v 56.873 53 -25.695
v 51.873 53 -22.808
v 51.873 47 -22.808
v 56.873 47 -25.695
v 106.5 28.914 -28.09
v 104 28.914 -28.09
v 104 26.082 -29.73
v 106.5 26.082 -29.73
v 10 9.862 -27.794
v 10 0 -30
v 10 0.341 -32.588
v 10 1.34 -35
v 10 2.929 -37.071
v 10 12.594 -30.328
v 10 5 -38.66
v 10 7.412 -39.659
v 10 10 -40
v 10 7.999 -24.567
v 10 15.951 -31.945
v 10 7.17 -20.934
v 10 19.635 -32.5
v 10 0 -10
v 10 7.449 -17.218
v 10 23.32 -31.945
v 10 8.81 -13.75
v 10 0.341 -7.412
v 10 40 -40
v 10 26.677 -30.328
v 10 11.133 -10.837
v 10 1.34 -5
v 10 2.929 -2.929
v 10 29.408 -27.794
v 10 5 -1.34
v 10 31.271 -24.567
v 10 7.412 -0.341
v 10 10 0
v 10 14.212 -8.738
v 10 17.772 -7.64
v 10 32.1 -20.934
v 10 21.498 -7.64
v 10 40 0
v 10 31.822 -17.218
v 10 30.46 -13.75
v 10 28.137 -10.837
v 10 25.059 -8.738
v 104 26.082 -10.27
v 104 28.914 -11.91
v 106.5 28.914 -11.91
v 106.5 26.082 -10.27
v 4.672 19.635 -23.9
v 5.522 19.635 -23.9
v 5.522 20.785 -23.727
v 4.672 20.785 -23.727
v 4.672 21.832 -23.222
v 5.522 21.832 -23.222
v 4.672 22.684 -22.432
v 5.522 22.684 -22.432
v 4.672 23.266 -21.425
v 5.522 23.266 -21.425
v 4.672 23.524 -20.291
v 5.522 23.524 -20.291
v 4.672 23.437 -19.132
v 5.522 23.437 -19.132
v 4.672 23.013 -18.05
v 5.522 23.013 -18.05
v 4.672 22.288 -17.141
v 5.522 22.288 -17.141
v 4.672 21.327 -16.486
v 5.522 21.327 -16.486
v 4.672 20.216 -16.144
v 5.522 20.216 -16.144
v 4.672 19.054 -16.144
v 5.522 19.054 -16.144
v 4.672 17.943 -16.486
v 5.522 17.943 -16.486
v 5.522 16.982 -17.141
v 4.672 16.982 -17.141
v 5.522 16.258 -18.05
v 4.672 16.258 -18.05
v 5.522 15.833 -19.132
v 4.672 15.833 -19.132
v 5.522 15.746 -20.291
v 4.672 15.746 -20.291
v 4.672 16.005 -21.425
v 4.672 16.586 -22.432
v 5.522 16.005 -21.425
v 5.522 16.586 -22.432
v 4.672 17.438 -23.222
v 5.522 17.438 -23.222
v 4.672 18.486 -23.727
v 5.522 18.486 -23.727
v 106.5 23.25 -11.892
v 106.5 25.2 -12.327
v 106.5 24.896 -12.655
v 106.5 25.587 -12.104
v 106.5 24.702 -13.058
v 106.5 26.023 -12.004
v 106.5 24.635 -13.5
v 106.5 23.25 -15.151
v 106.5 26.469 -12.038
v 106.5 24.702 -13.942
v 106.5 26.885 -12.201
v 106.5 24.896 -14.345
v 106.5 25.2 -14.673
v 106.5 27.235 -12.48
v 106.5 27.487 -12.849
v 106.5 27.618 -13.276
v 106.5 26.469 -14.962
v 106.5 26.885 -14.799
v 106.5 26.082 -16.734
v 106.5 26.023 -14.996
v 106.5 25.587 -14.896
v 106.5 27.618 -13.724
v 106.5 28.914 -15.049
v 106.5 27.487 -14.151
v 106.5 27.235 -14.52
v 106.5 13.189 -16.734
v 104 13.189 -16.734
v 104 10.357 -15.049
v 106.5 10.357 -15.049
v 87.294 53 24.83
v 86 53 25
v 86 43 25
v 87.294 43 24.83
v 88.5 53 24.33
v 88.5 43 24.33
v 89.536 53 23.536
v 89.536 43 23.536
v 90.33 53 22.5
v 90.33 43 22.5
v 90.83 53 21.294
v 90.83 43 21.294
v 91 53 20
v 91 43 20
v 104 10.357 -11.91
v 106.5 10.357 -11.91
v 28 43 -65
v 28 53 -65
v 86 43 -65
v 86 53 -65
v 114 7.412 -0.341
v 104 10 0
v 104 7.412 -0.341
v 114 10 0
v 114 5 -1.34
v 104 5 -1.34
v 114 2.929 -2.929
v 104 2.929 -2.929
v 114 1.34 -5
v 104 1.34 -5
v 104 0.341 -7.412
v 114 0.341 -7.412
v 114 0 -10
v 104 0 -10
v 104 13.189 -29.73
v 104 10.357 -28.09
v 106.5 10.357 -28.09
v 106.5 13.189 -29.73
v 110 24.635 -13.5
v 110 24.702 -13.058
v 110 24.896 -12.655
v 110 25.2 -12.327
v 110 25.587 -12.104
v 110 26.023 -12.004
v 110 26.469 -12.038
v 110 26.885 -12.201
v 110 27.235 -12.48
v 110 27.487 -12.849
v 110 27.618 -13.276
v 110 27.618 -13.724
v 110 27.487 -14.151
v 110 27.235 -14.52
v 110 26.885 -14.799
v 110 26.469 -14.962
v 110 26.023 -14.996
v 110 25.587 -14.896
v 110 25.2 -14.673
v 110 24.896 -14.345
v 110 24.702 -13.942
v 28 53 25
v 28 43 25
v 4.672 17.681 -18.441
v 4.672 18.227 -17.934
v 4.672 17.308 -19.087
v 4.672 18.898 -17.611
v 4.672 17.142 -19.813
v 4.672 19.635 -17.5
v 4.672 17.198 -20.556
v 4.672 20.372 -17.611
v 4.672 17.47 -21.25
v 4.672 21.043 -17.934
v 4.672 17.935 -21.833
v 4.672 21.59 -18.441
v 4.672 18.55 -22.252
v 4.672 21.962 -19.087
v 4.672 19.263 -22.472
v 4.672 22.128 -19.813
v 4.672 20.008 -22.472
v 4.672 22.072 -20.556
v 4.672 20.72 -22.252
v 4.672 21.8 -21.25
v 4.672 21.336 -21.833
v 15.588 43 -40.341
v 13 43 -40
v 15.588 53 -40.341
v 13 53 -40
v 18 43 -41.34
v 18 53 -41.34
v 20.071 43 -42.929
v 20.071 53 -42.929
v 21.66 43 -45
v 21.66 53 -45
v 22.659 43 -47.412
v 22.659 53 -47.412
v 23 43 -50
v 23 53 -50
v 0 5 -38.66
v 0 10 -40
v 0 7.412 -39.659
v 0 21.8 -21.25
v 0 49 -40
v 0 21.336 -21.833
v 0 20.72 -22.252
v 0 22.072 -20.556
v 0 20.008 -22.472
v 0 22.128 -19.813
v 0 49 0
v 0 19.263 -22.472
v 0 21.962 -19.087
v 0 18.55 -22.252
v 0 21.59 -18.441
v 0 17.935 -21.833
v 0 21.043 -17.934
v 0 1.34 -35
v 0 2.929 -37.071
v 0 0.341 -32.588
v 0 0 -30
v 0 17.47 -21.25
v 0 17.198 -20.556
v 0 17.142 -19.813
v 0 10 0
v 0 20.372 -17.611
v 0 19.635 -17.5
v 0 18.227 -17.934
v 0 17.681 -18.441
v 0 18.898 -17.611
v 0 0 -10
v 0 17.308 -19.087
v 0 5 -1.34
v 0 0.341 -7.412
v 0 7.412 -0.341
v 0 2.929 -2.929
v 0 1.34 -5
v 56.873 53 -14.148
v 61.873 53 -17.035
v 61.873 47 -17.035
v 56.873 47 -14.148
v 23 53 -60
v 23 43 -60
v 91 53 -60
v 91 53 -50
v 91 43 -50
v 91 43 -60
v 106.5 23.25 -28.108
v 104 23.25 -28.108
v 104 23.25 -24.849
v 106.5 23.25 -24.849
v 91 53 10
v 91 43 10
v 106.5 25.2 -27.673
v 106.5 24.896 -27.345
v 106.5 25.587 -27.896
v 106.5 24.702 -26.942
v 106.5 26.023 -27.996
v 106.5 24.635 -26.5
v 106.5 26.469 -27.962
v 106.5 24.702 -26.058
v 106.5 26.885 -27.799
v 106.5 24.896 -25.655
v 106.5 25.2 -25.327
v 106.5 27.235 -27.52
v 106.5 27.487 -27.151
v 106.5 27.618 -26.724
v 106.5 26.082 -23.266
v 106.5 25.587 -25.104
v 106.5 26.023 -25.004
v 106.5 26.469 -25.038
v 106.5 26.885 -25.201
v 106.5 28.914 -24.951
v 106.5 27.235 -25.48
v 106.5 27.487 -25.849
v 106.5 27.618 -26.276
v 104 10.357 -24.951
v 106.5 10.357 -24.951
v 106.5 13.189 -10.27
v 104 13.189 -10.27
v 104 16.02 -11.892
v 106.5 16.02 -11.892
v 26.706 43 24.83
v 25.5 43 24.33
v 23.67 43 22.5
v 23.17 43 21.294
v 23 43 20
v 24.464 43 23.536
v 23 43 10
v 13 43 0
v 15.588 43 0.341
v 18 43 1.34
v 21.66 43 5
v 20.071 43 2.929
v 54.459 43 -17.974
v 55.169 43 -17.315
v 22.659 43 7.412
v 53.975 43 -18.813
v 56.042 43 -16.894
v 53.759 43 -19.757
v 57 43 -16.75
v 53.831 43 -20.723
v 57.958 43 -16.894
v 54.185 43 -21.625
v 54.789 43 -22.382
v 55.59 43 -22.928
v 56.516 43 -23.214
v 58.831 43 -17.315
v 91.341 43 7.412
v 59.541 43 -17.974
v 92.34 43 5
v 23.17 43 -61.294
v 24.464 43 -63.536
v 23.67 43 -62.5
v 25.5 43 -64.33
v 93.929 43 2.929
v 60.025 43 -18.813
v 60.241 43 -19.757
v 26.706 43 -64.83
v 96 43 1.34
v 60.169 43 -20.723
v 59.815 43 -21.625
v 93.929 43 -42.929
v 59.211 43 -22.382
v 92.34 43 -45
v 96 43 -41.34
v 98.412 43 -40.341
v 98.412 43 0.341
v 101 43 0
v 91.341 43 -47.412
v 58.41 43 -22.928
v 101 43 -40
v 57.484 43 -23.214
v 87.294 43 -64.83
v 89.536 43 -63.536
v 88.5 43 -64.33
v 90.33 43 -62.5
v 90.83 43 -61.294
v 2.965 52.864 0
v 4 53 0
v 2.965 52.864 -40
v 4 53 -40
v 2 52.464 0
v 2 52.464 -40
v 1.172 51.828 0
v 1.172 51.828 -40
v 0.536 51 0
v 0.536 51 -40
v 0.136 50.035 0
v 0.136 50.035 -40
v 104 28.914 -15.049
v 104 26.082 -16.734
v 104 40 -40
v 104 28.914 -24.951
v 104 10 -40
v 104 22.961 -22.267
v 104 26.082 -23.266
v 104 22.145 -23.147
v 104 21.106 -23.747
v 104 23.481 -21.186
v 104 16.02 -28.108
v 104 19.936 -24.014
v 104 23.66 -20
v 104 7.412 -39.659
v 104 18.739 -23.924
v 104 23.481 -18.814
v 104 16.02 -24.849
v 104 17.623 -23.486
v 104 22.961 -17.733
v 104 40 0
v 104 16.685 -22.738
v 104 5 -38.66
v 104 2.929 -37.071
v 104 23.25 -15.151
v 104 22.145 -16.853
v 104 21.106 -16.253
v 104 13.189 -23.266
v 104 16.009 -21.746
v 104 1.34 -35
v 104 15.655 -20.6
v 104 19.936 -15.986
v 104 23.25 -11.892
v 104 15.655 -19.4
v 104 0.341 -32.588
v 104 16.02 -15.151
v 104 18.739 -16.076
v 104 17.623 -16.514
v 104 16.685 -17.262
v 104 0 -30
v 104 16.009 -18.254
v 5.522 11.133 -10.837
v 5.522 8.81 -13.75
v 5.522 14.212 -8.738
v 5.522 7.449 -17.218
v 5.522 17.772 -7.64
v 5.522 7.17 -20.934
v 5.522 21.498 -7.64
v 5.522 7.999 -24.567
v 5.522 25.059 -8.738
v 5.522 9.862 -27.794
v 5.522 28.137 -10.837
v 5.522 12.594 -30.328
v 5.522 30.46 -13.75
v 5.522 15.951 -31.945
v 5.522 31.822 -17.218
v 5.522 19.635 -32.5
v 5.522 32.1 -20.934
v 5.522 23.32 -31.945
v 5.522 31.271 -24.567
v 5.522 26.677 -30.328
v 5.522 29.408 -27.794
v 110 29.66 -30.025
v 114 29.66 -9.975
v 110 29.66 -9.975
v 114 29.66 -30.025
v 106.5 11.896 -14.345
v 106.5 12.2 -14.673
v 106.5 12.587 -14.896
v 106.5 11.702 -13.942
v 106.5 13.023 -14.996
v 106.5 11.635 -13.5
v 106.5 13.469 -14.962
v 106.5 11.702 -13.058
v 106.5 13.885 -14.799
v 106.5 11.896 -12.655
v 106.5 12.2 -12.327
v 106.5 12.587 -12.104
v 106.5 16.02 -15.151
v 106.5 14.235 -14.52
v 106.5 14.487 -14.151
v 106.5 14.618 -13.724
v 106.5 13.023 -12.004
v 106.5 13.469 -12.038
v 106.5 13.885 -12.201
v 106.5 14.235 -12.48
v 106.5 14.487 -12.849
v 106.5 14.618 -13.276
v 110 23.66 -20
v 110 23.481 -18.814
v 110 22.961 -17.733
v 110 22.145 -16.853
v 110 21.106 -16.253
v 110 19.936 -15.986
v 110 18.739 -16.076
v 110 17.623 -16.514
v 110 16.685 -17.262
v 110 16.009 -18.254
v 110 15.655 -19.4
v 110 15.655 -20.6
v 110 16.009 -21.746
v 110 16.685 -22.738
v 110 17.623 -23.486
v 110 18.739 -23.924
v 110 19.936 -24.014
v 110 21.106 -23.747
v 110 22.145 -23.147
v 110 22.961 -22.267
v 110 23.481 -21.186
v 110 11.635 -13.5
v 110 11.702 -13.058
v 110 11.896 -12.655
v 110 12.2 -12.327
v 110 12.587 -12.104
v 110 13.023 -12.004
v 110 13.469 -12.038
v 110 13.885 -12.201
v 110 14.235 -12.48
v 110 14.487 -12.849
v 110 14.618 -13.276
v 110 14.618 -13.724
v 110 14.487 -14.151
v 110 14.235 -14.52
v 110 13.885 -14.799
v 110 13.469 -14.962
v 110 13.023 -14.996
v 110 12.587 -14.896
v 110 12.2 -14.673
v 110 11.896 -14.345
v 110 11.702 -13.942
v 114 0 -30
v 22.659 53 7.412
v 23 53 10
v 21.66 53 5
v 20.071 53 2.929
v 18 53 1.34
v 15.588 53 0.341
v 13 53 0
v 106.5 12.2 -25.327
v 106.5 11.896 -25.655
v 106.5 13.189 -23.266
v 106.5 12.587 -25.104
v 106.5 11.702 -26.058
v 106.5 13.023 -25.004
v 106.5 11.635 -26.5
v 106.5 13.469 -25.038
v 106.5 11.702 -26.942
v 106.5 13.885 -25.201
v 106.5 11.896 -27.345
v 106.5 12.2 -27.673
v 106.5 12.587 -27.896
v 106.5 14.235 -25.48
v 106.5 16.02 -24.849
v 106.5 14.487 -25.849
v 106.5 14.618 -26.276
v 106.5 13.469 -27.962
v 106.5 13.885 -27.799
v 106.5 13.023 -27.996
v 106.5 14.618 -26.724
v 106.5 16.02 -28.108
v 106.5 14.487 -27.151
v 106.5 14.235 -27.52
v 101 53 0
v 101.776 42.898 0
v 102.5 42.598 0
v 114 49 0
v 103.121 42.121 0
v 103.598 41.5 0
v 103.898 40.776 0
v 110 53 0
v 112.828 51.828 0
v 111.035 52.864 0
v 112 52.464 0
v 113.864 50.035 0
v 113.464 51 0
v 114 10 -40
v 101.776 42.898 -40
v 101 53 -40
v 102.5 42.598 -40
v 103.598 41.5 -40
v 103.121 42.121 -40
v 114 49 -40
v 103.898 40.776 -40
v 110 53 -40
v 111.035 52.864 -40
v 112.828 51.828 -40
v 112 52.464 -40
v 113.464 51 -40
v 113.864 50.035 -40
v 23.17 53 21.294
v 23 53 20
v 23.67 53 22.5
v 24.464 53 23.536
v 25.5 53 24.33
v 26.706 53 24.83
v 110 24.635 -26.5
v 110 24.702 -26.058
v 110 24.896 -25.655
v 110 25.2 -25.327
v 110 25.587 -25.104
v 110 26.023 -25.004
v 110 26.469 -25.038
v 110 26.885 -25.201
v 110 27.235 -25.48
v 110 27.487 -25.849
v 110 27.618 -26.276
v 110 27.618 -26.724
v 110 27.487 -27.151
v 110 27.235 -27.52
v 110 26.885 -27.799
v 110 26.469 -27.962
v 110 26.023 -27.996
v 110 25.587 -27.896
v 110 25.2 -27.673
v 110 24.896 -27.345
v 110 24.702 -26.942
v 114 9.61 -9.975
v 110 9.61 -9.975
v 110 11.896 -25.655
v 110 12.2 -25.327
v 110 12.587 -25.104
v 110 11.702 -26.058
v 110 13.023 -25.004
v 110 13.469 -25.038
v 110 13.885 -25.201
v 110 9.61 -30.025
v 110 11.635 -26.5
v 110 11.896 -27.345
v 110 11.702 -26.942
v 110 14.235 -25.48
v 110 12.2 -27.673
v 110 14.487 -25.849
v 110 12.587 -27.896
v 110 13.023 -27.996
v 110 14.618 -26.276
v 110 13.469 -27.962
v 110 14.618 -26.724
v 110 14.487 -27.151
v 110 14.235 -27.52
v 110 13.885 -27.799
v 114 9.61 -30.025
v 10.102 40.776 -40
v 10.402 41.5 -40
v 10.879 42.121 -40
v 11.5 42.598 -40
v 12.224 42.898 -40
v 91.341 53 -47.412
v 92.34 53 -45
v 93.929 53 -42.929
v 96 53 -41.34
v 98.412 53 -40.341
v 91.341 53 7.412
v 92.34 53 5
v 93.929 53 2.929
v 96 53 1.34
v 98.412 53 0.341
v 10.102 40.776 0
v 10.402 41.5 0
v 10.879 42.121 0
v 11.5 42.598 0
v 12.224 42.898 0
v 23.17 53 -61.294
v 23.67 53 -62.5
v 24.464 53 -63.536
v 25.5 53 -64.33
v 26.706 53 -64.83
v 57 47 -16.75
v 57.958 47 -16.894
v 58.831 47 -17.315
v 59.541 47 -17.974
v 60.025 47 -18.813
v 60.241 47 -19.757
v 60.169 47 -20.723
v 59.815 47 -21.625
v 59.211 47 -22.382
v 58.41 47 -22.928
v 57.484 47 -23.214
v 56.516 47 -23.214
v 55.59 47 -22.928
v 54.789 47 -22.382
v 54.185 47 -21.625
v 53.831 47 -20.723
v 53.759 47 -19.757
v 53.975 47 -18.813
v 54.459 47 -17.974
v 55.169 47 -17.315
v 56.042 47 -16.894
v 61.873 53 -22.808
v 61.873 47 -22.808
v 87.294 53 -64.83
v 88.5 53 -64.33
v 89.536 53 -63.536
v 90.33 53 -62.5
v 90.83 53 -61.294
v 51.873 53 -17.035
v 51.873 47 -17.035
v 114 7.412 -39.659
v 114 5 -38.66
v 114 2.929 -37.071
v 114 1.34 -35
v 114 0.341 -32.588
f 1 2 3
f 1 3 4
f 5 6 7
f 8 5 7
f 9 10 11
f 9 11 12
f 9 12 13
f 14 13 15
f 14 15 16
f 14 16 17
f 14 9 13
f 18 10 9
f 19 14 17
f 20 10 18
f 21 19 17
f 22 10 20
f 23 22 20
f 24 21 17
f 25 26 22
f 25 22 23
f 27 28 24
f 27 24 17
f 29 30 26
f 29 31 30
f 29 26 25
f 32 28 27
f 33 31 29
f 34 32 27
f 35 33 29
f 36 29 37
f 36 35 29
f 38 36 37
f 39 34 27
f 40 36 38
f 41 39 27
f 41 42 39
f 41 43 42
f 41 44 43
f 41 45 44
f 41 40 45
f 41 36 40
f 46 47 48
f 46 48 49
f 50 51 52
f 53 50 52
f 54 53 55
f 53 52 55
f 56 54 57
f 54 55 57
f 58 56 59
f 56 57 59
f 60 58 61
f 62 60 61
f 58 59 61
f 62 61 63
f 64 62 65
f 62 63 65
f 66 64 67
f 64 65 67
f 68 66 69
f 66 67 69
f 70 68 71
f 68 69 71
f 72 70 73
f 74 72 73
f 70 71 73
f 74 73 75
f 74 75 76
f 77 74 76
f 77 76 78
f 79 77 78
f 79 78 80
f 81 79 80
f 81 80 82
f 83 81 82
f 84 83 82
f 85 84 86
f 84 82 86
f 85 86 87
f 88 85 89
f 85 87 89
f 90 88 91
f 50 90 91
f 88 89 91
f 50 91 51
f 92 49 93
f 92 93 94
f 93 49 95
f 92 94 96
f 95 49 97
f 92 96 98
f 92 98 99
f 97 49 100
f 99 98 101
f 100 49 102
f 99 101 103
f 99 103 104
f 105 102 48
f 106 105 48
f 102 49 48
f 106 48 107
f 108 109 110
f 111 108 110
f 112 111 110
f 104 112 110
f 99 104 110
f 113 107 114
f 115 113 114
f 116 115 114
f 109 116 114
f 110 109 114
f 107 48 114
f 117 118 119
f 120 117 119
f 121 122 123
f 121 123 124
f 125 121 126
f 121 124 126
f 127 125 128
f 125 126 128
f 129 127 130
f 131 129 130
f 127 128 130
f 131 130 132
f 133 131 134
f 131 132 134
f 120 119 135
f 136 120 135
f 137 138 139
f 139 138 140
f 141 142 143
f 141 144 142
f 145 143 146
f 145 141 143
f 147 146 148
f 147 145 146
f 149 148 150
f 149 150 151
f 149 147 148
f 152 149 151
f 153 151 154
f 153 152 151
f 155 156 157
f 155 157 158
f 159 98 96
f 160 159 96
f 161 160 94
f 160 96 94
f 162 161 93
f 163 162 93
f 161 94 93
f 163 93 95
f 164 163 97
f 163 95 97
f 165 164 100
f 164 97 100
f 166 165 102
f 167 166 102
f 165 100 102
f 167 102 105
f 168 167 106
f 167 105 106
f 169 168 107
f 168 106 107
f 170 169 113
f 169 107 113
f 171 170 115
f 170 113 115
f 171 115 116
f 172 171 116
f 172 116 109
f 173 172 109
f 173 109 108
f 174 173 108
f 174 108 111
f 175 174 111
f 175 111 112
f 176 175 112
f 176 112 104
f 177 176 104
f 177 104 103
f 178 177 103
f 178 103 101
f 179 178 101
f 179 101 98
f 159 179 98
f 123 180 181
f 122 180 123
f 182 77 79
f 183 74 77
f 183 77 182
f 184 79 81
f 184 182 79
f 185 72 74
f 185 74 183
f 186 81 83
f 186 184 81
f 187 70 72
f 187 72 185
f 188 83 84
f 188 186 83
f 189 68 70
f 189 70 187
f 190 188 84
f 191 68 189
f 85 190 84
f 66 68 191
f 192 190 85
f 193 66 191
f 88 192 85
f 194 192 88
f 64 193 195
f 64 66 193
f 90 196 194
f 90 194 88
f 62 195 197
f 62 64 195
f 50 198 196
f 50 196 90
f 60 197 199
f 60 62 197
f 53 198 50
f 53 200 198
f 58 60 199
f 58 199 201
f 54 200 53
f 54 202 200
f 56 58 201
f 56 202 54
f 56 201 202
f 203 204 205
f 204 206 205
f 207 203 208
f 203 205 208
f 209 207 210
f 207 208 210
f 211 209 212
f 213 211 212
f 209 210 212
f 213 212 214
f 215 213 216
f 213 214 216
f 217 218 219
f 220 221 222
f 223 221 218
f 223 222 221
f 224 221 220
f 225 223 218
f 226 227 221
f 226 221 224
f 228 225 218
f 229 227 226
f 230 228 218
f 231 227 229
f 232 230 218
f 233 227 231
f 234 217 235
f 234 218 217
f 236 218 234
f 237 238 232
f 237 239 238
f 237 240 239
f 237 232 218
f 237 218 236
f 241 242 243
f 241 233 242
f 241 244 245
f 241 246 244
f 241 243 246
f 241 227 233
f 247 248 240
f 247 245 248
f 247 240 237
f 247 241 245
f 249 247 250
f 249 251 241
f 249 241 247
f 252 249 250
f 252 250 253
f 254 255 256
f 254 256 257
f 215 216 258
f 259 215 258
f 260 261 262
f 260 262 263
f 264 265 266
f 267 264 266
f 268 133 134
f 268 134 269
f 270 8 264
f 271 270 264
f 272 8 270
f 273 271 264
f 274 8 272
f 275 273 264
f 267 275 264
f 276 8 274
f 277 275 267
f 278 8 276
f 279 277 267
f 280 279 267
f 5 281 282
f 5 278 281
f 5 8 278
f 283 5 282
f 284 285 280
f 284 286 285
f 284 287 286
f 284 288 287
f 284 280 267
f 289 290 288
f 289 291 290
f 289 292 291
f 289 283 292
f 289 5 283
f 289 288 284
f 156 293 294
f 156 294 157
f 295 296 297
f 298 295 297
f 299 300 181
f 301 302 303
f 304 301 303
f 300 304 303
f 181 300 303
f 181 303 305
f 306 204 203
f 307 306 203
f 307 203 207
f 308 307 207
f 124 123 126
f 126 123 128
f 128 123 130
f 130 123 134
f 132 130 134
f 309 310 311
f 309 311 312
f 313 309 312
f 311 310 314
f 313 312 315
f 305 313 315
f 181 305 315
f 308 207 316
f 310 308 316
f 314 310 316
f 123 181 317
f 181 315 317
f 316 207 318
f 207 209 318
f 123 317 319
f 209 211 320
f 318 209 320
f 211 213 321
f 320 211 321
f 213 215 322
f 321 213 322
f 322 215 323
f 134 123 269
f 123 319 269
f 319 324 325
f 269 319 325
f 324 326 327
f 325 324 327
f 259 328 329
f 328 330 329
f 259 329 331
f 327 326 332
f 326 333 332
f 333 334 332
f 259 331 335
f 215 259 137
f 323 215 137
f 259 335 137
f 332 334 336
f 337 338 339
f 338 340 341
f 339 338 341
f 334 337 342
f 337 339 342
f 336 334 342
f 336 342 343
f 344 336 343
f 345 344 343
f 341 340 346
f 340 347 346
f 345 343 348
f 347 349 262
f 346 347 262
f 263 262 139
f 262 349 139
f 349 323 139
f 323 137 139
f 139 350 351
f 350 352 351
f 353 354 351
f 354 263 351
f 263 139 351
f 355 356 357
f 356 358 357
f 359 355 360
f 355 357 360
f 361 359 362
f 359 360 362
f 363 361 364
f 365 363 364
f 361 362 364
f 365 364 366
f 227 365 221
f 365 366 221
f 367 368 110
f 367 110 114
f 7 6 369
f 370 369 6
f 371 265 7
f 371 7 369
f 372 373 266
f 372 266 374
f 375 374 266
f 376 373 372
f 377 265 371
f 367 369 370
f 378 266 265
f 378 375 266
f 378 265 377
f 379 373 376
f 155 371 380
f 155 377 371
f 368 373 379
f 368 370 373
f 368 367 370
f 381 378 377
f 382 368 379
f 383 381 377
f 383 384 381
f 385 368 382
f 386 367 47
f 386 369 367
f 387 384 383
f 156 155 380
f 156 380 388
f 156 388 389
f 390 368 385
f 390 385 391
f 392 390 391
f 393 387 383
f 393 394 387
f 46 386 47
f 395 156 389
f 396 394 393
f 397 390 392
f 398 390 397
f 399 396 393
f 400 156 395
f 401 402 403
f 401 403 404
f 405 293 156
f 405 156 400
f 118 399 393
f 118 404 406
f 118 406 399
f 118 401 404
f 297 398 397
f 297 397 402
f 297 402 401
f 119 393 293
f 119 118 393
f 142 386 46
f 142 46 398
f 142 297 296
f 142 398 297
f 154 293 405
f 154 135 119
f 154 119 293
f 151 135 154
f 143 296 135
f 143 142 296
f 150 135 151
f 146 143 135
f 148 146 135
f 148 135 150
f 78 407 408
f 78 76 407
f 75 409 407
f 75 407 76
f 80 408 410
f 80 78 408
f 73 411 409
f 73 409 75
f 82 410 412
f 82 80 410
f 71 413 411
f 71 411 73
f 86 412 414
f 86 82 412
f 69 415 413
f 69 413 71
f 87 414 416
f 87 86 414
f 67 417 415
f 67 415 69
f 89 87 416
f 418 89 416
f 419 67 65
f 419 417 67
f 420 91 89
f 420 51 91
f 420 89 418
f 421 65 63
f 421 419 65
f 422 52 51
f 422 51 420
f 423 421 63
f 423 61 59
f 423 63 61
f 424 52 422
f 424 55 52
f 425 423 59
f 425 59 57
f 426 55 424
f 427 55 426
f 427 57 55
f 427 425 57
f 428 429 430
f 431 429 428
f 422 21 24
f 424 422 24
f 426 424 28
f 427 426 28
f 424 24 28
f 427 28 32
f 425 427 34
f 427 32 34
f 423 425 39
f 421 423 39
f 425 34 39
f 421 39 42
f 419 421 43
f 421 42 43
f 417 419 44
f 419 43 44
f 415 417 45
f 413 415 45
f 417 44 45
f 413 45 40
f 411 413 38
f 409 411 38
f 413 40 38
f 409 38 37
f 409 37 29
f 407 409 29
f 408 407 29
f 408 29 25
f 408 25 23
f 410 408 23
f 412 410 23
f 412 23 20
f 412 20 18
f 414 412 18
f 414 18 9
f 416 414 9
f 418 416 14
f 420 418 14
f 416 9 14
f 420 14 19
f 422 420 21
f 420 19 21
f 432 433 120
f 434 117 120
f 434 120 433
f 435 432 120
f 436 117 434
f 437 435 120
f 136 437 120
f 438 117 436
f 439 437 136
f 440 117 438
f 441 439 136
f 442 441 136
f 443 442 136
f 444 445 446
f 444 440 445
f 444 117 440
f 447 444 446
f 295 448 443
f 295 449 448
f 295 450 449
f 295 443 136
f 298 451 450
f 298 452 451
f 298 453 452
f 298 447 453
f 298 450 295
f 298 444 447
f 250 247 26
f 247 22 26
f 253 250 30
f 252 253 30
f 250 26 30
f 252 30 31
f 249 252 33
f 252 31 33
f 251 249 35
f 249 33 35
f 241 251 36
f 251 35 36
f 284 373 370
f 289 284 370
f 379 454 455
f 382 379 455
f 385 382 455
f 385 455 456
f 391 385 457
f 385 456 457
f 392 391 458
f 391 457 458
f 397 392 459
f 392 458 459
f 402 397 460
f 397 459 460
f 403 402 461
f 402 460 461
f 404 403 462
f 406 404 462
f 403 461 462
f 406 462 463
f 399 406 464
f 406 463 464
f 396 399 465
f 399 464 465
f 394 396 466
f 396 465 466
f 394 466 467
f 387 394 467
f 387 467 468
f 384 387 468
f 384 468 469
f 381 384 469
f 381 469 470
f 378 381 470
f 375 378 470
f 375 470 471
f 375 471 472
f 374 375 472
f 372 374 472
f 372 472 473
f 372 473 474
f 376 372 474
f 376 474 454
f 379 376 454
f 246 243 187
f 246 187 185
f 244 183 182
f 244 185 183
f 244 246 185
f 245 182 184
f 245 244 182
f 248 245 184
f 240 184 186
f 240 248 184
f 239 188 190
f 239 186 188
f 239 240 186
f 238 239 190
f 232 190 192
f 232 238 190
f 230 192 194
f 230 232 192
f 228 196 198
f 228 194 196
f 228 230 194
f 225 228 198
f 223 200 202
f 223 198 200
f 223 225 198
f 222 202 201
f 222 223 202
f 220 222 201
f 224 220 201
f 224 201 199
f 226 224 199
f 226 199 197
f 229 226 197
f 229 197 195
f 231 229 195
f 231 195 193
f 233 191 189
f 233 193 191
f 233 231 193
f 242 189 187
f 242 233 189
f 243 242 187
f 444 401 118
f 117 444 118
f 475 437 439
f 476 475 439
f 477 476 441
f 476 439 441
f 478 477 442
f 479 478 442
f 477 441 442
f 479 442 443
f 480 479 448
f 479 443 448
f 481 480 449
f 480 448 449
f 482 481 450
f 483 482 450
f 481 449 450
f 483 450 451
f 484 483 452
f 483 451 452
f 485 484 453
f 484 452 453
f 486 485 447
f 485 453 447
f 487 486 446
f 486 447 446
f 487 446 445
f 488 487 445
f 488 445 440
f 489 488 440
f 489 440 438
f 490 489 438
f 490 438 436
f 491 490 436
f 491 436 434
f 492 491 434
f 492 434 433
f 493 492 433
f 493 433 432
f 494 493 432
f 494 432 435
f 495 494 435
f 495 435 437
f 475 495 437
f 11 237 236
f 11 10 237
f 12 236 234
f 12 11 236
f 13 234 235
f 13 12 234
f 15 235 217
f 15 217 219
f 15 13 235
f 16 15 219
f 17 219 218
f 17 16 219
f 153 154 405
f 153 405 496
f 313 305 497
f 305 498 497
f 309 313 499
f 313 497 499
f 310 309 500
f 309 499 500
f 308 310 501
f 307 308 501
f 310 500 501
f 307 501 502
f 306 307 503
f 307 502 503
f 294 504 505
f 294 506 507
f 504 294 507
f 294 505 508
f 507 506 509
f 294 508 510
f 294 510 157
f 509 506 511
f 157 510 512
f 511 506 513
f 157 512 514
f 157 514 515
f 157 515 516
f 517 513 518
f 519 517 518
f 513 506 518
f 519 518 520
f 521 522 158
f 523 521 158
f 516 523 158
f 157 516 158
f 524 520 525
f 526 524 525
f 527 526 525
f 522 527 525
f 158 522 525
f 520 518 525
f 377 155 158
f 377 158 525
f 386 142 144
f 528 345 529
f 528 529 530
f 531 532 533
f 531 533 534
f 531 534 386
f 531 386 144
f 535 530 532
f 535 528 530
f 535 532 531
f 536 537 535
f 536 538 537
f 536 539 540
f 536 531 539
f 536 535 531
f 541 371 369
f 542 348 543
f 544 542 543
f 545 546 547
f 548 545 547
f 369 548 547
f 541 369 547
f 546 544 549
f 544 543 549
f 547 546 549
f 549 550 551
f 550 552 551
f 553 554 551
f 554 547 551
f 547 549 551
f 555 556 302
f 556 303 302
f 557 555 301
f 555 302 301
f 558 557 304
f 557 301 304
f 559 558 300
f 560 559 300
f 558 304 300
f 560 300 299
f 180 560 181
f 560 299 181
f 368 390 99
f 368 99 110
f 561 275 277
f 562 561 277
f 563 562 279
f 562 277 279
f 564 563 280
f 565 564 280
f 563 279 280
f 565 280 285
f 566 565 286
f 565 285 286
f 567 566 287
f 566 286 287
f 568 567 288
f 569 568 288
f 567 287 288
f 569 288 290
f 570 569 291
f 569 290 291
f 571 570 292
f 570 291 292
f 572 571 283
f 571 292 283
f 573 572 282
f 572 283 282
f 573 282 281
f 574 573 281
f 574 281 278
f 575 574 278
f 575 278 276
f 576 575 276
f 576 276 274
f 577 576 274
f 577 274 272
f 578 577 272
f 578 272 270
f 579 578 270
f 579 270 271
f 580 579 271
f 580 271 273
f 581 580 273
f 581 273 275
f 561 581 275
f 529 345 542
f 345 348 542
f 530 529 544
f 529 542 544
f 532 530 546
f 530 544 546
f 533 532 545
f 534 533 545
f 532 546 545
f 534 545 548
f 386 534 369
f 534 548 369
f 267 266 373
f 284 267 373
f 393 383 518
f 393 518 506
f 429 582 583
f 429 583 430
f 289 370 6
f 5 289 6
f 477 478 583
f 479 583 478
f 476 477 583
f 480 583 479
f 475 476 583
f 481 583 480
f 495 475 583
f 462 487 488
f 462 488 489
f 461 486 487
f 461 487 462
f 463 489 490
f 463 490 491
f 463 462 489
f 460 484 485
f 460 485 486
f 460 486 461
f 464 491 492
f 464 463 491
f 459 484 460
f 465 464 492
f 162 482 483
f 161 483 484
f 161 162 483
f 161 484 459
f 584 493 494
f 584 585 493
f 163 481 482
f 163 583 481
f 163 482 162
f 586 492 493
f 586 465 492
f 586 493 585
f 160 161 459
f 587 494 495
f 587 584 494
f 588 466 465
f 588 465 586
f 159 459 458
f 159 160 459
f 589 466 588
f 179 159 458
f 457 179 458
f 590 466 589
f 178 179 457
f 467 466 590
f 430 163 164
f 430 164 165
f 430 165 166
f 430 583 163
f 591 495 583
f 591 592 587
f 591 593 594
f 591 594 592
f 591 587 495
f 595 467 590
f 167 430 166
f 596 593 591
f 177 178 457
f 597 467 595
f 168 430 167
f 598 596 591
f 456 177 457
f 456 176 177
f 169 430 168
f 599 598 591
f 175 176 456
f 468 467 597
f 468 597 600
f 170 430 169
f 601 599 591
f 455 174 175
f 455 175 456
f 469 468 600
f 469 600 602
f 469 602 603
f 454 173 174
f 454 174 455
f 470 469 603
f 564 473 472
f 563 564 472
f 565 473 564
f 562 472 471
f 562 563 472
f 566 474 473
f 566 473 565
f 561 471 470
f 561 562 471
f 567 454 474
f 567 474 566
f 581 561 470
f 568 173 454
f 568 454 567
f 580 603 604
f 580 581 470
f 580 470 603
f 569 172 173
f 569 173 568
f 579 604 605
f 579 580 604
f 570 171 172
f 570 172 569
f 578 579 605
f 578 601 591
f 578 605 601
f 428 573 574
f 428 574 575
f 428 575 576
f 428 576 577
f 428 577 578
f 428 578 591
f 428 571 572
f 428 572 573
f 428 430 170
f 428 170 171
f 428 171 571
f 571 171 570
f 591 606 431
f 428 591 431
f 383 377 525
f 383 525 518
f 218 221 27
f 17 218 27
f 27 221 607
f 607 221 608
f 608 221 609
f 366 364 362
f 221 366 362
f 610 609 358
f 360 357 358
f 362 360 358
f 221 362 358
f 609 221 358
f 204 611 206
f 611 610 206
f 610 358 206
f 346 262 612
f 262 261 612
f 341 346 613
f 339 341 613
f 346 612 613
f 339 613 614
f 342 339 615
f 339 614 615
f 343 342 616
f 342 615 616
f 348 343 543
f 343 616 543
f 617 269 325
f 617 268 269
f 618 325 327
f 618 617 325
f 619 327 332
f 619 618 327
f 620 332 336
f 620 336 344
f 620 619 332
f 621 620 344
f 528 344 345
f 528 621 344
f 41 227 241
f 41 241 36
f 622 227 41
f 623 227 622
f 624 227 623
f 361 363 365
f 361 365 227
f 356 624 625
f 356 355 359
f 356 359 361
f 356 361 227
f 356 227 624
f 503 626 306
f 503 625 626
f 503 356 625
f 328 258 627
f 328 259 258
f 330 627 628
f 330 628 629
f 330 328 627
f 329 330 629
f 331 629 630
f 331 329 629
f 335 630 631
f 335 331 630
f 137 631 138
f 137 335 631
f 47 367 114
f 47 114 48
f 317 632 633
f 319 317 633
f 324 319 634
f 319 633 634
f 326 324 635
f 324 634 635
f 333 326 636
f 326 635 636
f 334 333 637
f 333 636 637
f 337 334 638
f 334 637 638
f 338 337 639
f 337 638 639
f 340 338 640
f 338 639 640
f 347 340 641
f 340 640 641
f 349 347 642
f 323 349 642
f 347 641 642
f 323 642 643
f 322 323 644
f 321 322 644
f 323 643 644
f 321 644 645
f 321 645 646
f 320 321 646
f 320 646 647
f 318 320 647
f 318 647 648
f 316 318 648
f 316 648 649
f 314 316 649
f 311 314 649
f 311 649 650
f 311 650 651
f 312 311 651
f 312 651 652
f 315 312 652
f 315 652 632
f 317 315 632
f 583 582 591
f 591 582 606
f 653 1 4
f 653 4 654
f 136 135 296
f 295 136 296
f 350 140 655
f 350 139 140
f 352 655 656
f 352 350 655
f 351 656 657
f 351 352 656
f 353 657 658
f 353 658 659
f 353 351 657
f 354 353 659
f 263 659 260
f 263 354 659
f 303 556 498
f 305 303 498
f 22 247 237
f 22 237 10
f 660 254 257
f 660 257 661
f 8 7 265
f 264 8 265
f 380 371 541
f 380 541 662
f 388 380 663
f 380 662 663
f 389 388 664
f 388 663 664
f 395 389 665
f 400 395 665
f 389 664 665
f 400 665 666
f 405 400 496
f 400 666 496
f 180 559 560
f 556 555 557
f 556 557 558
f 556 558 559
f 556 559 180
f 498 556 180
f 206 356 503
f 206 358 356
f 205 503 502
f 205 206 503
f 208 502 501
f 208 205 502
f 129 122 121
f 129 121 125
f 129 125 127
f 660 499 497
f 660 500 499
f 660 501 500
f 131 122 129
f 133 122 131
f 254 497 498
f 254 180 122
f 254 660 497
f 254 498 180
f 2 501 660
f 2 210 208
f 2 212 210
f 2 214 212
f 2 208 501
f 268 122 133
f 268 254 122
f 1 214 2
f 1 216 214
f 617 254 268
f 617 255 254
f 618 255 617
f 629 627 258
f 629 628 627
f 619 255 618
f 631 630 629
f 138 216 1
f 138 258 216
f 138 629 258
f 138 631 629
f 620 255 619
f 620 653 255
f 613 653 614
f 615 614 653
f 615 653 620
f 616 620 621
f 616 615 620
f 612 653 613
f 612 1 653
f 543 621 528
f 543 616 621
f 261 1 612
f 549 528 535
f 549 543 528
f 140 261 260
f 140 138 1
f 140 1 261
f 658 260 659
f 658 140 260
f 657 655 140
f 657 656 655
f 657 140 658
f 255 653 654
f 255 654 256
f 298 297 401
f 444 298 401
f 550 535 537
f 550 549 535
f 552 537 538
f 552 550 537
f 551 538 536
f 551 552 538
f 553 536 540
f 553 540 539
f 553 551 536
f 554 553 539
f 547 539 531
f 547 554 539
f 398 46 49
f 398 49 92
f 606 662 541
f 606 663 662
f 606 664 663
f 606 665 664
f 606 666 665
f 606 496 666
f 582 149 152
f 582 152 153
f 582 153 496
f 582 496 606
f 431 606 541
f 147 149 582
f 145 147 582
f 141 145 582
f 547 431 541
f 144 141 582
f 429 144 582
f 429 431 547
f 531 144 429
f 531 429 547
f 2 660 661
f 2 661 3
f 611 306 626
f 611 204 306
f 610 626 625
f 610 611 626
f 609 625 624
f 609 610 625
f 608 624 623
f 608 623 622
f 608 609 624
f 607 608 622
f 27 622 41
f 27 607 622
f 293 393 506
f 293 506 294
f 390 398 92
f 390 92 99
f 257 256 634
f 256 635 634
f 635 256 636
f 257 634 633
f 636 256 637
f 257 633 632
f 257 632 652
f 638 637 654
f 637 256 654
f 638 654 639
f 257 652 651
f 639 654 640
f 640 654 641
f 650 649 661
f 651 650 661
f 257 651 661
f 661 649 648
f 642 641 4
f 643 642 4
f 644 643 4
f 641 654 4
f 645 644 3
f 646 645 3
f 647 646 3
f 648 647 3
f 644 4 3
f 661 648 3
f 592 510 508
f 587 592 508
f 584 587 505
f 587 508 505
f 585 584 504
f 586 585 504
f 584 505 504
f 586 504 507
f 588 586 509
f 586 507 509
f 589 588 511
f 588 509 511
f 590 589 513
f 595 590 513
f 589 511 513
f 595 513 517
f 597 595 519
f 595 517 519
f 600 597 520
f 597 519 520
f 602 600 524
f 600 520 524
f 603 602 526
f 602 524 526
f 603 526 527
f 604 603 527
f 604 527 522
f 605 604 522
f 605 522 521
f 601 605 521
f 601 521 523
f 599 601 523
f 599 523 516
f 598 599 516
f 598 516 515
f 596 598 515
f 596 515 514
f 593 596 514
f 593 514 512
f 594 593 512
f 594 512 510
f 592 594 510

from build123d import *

# Parameters (mm, degrees)
BOSS_EXTRUDE1_DEPTH     = 40
SKETCH2_R               = 12.5
CUT_EXTRUDE1_DEPTH      = 4.4775
FILLET1_R               = 10
CUT_EXTRUDE2_DEPTH      = 131.2
CUT_EXTRUDE2_DEPTH_BACK = 14.2
SKETCH4_R               = 2.5
SKETCH6_W               = 68
SKETCH6_H               = 90
BOSS_EXTRUDE4_DEPTH     = 10
FILLET2_R               = 10
FILLET3_R               = 5
FILLET4_R               = 4
CUT_EXTRUDE3_START      = -2.2025
SKETCH7_R               = 3.9
CUT_EXTRUDE3_DEPTH      = 0.85
SKETCH8_R               = 3.25
CUT_EXTRUDE4_DEPTH      = 10
SKETCH9_R               = 4.025
CUT_EXTRUDE5_DEPTH      = 12
SKETCH10_W              = 20.05
SKETCH10_H              = 20.05
CUT_EXTRUDE6_DEPTH      = 4
CUT_EXTRUDE7_DEPTH      = 6
CUT_EXTRUDE9_DEPTH      = 2.5
CUT_EXTRUDE10_REACH     = 138.104
CUT_EXTRUDE10_START     = -2.5
SKETCH15_R              = 1.5
FILLET5_R               = 3


with BuildPart() as part:
    # Sketch1 → Boss-Extrude1 (new body)
    with BuildSketch(Plane.XY):
        Polygon((10, 0), (10, 43), (104, 43), (104, 0), (114, 0), (114, 53), (0, 53), (0, 0), align=None)
    extrude(amount=-BOSS_EXTRUDE1_DEPTH)

    # Sketch2 → Cut-Extrude1 (cut)
    with BuildSketch(Plane(origin=(10, 0, 0), x_dir=(0, 0, -1), z_dir=(1, 0, 0))):
        with Locations((20, 19.635146369)):
            Circle(SKETCH2_R)
    extrude(amount=-CUT_EXTRUDE1_DEPTH, mode=Mode.SUBTRACT)

    # Fillet1
    fillet1_edges = [part.edges().sort_by_distance(p)[0] for p in [
        (5, 0, 0),
        (109, 0, -40),
        (5, 0, -40),
        (109, 0, 0),
    ]]
    fillet(fillet1_edges, radius=FILLET1_R)

    # Sketch4 → Cut-Extrude2 (cut, two sides: drawn at the far end of the back side and taken through both)
    with BuildSketch(Plane(origin=(7.725, 0, 0), x_dir=(0, 0, -1), z_dir=(1, 0, 0)).offset(-CUT_EXTRUDE2_DEPTH_BACK)):
        with Locations(Location((20, 19.635146369, 0), (0, 0, 180))):
            Circle(SKETCH4_R)
    extrude(amount=CUT_EXTRUDE2_DEPTH + CUT_EXTRUDE2_DEPTH_BACK, mode=Mode.SUBTRACT)

    # Sketch6 → Boss-Extrude4 (add)
    with BuildSketch(Plane(origin=(0, 53, 0), x_dir=(1, 0, 0), z_dir=(0, 1, 0))):
        with Locations((57, 20)):
            Rectangle(SKETCH6_W, SKETCH6_H)
    extrude(amount=-BOSS_EXTRUDE4_DEPTH)

    # Fillet2
    fillet2_edges = [part.edges().sort_by_distance(p)[0] for p in [
        (23, 48, 0),
        (91, 48, 0),
        (91, 48, -40),
        (23, 48, -40),
    ]]
    fillet(fillet2_edges, radius=FILLET2_R)

    # Fillet3
    fillet3_edges = [part.edges().sort_by_distance(p)[0] for p in [
        (23, 48, 25),
        (91, 48, -65),
        (91, 48, 25),
        (23, 48, -65),
    ]]
    fillet(fillet3_edges, radius=FILLET3_R)

    # Fillet4
    fillet4_edges = [part.edges().sort_by_distance(p)[0] for p in [
        (0, 53, -20),
        (114, 53, -20),
    ]]
    fillet(fillet4_edges, radius=FILLET4_R)

    # Sketch7 → Cut-Extrude3 (cut)
    with BuildSketch(Plane(origin=(7.725, 0, 0), x_dir=(0, 0, -1), z_dir=(1, 0, 0)).offset(CUT_EXTRUDE3_START)):
        with Locations((20, 19.635146369)):
            Circle(SKETCH7_R)
    extrude(amount=-CUT_EXTRUDE3_DEPTH, mode=Mode.SUBTRACT)

    # Sketch8 → Cut-Extrude4 (cut)
    with BuildSketch(Plane(origin=(0, 53, 0), x_dir=(1, 0, 0), z_dir=(0, 1, 0))):
        with Locations(Location((57, 20, 0), (0, 0, 270))):
            Circle(SKETCH8_R)
    extrude(amount=-CUT_EXTRUDE4_DEPTH, mode=Mode.SUBTRACT)

    # Sketch9 → Cut-Extrude5 (cut)
    with BuildSketch(Plane(origin=(114, 0, 0), x_dir=(0, 0, -1), z_dir=(1, 0, 0))):
        with Locations(Location((20, 19.635146369, 0), (0, 0, 90))):
            Circle(SKETCH9_R)
    extrude(amount=-CUT_EXTRUDE5_DEPTH, mode=Mode.SUBTRACT)

    # Sketch10 → Cut-Extrude6 (cut)
    with BuildSketch(Plane(origin=(114, 0, 0), x_dir=(0, 0, -1), z_dir=(1, 0, 0))):
        with Locations((20, 19.635146369)):
            Rectangle(SKETCH10_W, SKETCH10_H)
    extrude(amount=-CUT_EXTRUDE6_DEPTH, mode=Mode.SUBTRACT)

    # Sketch14 → Cut-Extrude7 (cut)
    with BuildSketch(Plane(origin=(0, 53, 0), x_dir=(1, 0, 0), z_dir=(0, 1, 0))):
        Polygon((56.872881106, 25.694991584), (61.872881106, 22.808240238), (61.872881106, 17.034737546), (56.872881106, 14.1479862), (51.872881106, 17.034737546), (51.872881106, 22.808240238), align=None)
    extrude(amount=-CUT_EXTRUDE7_DEPTH, mode=Mode.SUBTRACT)

    # Sketch18 → Cut-Extrude9 (cut)
    with BuildSketch(Plane.ZY.offset(-104)):
        Polygon((-15.048857438, 28.91356654), (-11.910134999, 28.91356654), (-10.270487153, 26.081726401), (-11.891583597, 23.249886262), (-15.151000849, 23.249886262), (-16.733963505, 26.081726401), align=None)
        Polygon((-23.266036495, 26.081726401), (-24.951142562, 28.91356654), (-28.089865001, 28.91356654), (-29.729512847, 26.081726401), (-28.108416403, 23.249886262), (-24.848999151, 23.249886262), align=None)
        Polygon((-16.733963505, 13.188566337), (-15.048857438, 10.356726198), (-11.910134999, 10.356726198), (-10.270487153, 13.188566337), (-11.891583597, 16.020406476), (-15.151000849, 16.020406476), align=None)
        Polygon((-24.848999151, 16.020406476), (-23.266036495, 13.188566337), (-24.951142562, 10.356726198), (-28.089865001, 10.356726198), (-29.729512847, 13.188566337), (-28.108416403, 16.020406476), align=None)
    extrude(amount=-CUT_EXTRUDE9_DEPTH, mode=Mode.SUBTRACT)

    # Sketch15 → Cut-Extrude10 (cut, up to next)
    with BuildSketch(Plane.ZY.offset(-104).offset(CUT_EXTRUDE10_START), mode=Mode.PRIVATE) as cut_extrude10_sk1:
        with Locations(Location((-26.5, 26.135146369, 0), (0, 0, 270))):
            Circle(SKETCH15_R)
    cut_extrude10_tool1 = extrude(cut_extrude10_sk1.sketch, amount=-CUT_EXTRUDE10_REACH, mode=Mode.PRIVATE) & part.part
    # Sketch15 → Cut-Extrude10 (cut, up to next)
    with BuildSketch(Plane.ZY.offset(-104).offset(CUT_EXTRUDE10_START), mode=Mode.PRIVATE) as cut_extrude10_sk2:
        with Locations(Location((-13.5, 26.135146369, 0), (0, 0, 270))):
            Circle(SKETCH15_R)
    cut_extrude10_tool2 = extrude(cut_extrude10_sk2.sketch, amount=-CUT_EXTRUDE10_REACH, mode=Mode.PRIVATE) & part.part
    # Sketch15 → Cut-Extrude10 (cut, up to next)
    with BuildSketch(Plane.ZY.offset(-104).offset(CUT_EXTRUDE10_START), mode=Mode.PRIVATE) as cut_extrude10_sk3:
        with Locations(Location((-13.5, 13.135146369, 0), (0, 0, 270))):
            Circle(SKETCH15_R)
    cut_extrude10_tool3 = extrude(cut_extrude10_sk3.sketch, amount=-CUT_EXTRUDE10_REACH, mode=Mode.PRIVATE) & part.part
    # Sketch15 → Cut-Extrude10 (cut, up to next)
    with BuildSketch(Plane.ZY.offset(-104).offset(CUT_EXTRUDE10_START), mode=Mode.PRIVATE) as cut_extrude10_sk4:
        with Locations(Location((-26.5, 13.135146369, 0), (0, 0, 270))):
            Circle(SKETCH15_R)
    cut_extrude10_tool4 = extrude(cut_extrude10_sk4.sketch, amount=-CUT_EXTRUDE10_REACH, mode=Mode.PRIVATE) & part.part
    add(cut_extrude10_tool1.solids().sort_by_distance((106.5, 26.135146, -26.5))[0], mode=Mode.SUBTRACT)
    add(cut_extrude10_tool2.solids().sort_by_distance((106.5, 26.135146, -13.5))[0], mode=Mode.SUBTRACT)
    add(cut_extrude10_tool3.solids().sort_by_distance((106.5, 13.135146, -13.5))[0], mode=Mode.SUBTRACT)
    add(cut_extrude10_tool4.solids().sort_by_distance((106.5, 13.135146, -26.5))[0], mode=Mode.SUBTRACT)

    # Fillet5
    fillet5_edges = [part.edges().sort_by_distance(p)[0] for p in [
        (104, 43, -20),
        (10, 43, -20),
    ]]
    fillet(fillet5_edges, radius=FILLET5_R)


solid = part.part
